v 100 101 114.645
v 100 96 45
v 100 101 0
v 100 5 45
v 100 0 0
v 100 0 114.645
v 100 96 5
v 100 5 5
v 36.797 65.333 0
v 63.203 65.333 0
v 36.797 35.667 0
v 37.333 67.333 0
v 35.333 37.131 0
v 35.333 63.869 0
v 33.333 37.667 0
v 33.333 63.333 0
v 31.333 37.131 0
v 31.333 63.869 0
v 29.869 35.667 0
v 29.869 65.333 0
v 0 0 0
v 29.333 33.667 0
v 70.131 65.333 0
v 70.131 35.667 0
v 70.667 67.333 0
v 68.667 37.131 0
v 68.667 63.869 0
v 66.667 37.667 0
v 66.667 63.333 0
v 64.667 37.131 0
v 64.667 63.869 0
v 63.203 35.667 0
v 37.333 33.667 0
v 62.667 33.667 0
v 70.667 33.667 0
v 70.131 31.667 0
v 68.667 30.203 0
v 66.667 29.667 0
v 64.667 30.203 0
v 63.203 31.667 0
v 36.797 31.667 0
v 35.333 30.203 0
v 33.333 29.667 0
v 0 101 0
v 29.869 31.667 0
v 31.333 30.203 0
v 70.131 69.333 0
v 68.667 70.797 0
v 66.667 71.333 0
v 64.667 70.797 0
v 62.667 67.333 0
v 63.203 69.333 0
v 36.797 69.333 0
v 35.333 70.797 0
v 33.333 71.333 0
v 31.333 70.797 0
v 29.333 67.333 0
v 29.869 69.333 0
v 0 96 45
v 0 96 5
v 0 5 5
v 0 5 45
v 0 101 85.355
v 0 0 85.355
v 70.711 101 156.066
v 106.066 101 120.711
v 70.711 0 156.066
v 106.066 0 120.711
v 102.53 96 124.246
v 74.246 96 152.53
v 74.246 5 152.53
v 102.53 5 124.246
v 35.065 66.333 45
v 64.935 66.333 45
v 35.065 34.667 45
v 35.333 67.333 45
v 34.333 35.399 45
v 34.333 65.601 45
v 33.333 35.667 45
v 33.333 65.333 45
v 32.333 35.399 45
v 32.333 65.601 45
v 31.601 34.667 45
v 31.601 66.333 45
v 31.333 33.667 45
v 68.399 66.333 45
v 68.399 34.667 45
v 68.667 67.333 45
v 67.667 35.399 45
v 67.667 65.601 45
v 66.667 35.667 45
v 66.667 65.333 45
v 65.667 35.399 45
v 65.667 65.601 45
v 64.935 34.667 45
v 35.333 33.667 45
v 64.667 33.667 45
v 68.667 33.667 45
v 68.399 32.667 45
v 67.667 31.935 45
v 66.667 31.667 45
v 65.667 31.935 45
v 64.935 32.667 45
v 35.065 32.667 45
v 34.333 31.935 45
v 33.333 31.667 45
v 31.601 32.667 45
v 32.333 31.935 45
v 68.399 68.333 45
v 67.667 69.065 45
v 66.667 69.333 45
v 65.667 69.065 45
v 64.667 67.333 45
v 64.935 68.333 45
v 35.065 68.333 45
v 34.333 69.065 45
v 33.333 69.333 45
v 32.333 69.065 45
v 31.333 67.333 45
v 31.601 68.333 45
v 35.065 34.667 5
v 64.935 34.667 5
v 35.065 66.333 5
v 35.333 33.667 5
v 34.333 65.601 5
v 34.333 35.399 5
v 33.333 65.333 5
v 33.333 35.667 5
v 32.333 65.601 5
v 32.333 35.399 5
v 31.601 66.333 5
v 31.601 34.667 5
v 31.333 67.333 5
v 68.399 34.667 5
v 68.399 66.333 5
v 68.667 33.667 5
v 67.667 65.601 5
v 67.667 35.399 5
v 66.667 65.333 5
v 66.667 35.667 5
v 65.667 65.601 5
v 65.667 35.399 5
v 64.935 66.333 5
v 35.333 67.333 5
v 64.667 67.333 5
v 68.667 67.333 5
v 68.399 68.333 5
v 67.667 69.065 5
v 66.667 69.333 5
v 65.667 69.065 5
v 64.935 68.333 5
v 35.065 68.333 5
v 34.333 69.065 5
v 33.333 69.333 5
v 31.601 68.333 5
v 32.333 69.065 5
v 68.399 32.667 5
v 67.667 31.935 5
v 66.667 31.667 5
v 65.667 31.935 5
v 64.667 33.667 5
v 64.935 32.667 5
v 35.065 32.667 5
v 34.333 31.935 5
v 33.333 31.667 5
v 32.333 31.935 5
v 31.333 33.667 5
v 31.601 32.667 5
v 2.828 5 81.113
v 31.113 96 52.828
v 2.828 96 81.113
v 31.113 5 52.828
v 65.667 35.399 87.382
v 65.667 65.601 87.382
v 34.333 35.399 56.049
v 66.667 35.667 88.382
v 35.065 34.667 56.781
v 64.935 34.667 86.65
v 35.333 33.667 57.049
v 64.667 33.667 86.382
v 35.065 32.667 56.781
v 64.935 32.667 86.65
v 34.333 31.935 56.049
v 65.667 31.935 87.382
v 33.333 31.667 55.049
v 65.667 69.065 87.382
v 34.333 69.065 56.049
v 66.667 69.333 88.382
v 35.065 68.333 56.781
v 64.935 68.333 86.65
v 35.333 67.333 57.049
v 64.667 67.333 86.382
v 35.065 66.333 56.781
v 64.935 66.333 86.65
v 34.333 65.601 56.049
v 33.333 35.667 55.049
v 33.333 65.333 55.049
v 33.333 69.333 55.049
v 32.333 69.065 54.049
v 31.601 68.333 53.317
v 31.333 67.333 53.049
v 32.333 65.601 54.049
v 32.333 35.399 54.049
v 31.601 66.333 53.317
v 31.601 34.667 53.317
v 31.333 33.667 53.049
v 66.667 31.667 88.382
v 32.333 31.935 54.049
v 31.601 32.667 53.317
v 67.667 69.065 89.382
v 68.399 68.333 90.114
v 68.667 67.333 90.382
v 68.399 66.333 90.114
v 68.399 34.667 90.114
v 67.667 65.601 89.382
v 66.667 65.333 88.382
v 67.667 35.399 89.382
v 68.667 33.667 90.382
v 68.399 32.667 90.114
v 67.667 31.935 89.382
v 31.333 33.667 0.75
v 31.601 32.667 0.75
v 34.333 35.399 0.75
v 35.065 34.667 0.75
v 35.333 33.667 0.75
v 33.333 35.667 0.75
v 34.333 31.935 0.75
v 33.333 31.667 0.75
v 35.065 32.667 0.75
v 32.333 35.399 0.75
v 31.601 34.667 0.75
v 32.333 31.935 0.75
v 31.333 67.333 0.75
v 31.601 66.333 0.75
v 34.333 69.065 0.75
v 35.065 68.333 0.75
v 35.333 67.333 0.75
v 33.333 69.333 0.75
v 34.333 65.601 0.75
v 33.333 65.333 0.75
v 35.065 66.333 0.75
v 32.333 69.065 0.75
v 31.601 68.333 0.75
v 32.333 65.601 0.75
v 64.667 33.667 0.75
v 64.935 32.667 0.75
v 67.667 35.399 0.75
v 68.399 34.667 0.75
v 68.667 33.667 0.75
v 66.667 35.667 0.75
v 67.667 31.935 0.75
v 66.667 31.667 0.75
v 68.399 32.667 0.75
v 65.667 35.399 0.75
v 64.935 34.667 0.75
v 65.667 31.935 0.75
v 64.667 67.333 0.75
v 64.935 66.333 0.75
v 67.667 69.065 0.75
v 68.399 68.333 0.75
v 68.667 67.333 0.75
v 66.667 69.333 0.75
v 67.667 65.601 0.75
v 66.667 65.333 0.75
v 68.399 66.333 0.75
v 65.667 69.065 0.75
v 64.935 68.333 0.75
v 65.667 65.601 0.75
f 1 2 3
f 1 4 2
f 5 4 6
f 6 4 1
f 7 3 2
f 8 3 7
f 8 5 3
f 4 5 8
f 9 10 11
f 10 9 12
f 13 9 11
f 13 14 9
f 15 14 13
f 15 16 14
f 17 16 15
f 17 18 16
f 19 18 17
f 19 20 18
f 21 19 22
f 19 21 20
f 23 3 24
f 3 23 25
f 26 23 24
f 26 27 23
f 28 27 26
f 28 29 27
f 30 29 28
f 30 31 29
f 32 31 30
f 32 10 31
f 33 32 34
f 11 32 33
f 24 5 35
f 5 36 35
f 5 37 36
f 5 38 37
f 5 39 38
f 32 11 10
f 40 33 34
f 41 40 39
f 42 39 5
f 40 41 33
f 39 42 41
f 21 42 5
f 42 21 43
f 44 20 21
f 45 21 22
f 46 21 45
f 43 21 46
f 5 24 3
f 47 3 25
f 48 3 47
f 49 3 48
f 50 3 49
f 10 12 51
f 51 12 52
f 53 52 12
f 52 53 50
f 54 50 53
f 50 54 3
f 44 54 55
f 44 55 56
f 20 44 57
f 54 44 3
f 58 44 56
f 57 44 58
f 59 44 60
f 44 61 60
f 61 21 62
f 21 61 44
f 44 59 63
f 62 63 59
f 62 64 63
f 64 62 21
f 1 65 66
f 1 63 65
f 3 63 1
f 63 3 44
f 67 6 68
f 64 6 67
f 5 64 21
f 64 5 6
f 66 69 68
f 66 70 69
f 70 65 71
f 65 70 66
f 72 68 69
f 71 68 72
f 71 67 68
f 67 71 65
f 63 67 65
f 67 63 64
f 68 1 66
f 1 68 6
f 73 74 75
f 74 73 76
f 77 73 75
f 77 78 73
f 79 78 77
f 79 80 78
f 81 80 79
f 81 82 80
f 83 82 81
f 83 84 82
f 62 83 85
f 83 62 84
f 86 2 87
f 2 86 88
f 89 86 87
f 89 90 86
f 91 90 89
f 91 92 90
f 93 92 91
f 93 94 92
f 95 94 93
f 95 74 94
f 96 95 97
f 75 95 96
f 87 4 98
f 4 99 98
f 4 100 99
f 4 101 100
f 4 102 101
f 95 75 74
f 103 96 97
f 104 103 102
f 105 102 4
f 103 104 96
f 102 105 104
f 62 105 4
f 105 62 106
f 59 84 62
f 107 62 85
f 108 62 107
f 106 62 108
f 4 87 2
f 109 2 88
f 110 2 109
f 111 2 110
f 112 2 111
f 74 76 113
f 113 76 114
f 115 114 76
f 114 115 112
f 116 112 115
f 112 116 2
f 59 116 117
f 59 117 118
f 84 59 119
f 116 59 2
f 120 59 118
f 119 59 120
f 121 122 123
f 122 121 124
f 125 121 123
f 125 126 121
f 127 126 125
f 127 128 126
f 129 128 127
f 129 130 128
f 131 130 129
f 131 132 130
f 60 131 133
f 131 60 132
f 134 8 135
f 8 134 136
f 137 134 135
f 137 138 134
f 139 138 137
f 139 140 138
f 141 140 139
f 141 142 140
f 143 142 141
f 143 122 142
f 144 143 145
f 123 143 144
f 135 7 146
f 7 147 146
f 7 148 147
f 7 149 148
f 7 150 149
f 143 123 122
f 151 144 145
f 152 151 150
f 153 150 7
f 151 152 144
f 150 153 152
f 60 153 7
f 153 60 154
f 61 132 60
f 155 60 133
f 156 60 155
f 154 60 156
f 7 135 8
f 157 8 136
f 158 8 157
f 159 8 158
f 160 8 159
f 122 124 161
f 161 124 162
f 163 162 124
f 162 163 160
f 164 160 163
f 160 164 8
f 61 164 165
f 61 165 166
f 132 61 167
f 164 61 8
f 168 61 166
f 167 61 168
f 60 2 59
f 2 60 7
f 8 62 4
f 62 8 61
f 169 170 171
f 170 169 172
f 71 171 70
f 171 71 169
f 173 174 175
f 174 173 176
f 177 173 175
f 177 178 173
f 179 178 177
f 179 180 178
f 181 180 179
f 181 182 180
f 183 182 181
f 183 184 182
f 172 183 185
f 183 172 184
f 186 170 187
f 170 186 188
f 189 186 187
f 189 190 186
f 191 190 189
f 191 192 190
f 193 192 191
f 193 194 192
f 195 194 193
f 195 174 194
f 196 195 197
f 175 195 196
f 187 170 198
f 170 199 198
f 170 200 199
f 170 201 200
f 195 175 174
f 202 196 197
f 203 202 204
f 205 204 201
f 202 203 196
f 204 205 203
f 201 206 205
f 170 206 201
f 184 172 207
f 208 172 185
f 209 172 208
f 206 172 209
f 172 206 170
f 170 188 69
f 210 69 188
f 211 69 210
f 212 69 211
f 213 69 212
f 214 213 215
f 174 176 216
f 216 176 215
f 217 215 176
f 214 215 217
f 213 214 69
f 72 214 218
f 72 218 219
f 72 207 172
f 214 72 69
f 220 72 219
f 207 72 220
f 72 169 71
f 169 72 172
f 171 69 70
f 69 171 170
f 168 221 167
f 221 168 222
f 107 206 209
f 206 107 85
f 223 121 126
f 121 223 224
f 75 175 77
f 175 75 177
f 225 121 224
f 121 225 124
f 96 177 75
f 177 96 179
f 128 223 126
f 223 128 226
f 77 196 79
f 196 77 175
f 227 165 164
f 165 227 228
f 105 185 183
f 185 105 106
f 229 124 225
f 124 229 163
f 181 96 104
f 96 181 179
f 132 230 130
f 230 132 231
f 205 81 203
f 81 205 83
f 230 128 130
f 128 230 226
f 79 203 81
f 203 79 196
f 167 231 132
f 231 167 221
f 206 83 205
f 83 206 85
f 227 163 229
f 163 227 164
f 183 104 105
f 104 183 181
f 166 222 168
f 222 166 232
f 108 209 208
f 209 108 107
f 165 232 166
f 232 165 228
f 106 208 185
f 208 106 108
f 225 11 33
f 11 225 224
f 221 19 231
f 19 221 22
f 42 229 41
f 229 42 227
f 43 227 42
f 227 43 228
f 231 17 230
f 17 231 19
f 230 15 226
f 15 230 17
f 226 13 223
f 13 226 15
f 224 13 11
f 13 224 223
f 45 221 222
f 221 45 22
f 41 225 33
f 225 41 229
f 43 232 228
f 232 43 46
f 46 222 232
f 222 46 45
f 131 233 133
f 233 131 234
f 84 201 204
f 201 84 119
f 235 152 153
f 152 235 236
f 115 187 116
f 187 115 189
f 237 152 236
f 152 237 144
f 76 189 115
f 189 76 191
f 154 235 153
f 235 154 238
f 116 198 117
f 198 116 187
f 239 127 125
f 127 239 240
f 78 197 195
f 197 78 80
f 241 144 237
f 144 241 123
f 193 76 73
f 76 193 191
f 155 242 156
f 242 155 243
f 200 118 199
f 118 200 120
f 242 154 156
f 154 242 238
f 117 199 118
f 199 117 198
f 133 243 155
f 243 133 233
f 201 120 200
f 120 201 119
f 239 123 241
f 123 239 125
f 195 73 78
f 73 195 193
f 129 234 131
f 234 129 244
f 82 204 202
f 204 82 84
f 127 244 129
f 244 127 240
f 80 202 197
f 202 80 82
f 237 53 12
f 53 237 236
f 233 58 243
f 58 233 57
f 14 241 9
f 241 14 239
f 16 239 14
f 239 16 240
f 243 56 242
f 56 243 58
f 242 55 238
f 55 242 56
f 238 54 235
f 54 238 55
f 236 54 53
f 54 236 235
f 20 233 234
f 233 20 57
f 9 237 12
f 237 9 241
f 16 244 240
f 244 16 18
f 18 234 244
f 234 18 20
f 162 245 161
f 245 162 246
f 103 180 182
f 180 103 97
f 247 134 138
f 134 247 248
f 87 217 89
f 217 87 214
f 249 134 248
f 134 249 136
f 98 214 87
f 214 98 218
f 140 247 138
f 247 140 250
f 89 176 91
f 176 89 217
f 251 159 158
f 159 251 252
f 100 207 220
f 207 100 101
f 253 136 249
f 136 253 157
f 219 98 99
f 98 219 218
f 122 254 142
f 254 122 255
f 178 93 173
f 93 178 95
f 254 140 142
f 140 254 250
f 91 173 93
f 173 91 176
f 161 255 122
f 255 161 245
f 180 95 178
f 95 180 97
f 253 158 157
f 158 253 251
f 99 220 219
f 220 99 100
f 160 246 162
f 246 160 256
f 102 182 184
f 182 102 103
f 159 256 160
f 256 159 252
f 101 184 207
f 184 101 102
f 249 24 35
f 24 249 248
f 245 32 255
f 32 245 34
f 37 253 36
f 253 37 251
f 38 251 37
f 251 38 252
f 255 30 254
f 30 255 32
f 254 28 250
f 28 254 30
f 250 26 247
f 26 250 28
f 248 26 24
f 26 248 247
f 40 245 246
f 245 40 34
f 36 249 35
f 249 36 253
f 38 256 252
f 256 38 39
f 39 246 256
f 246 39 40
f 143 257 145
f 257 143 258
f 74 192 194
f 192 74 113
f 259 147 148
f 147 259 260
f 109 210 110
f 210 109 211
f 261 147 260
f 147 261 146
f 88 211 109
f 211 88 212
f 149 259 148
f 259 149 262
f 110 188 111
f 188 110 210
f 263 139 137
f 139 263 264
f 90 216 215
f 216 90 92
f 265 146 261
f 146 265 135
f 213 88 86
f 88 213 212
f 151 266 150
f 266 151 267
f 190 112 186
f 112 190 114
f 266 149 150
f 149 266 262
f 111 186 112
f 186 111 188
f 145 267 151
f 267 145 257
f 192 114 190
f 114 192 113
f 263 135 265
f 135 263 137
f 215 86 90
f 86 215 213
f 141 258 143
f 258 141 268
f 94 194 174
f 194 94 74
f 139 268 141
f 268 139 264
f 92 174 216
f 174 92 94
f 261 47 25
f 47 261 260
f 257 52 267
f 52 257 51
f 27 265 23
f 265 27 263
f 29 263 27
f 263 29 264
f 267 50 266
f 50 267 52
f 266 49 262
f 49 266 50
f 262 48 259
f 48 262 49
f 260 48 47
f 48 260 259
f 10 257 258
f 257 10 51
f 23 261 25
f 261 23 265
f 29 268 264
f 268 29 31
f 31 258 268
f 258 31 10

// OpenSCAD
union() {
	difference() {
		difference() {
			difference() {
				difference() {
					difference() {
						difference() {
							union() {
								union() {
									union() {
										cube(size = [100, 101, 50]);
										translate(v = [35.3553390593, 0, 50]) {
											rotate(a = -45, v = [0, 1, 0]) {
												cube(size = [100, 101, 50]);
											}
										}
									}
									cube(size = [100, 101, 85.3553390593]);
								}
								translate(v = [50.0000000000, 0, 0]) {
									cube(size = [50.0000000000, 101, 120.7106781187]);
								}
							}
							translate(v = [-1, 5, 5]) {
								cube(size = [102, 91, 40]);
							}
						}
						translate(v = [35.3553390593, 0, 50]) {
							rotate(a = -45, v = [0, 1, 0]) {
								translate(v = [-1, 5, 5]) {
									cube(size = [102, 91, 40]);
								}
							}
						}
					}
					translate(v = [33.3333333333, 33.6666666667, 0]) {
						union() {
							cylinder($fn = 12, h = 84.2791184895, r = 2);
							translate(v = [0, 0, -1.5000000000]) {
								cylinder($fn = 12, h = 3, r1 = 8, r2 = 0);
							}
						}
					}
				}
				translate(v = [33.3333333333, 67.3333333333, 0]) {
					union() {
						cylinder($fn = 12, h = 84.2791184895, r = 2);
						translate(v = [0, 0, -1.5000000000]) {
							cylinder($fn = 12, h = 3, r1 = 8, r2 = 0);
						}
					}
				}
			}
			translate(v = [66.6666666667, 33.6666666667, 0]) {
				union() {
					cylinder($fn = 12, h = 107.8493445290, r = 2);
					translate(v = [0, 0, -1.5000000000]) {
						cylinder($fn = 12, h = 3, r1 = 8, r2 = 0);
					}
				}
			}
		}
		translate(v = [66.6666666667, 67.3333333333, 0]) {
			union() {
				cylinder($fn = 12, h = 107.8493445290, r = 2);
				translate(v = [0, 0, -1.5000000000]) {
					cylinder($fn = 12, h = 3, r1 = 8, r2 = 0);
				}
			}
		}
	}
}
